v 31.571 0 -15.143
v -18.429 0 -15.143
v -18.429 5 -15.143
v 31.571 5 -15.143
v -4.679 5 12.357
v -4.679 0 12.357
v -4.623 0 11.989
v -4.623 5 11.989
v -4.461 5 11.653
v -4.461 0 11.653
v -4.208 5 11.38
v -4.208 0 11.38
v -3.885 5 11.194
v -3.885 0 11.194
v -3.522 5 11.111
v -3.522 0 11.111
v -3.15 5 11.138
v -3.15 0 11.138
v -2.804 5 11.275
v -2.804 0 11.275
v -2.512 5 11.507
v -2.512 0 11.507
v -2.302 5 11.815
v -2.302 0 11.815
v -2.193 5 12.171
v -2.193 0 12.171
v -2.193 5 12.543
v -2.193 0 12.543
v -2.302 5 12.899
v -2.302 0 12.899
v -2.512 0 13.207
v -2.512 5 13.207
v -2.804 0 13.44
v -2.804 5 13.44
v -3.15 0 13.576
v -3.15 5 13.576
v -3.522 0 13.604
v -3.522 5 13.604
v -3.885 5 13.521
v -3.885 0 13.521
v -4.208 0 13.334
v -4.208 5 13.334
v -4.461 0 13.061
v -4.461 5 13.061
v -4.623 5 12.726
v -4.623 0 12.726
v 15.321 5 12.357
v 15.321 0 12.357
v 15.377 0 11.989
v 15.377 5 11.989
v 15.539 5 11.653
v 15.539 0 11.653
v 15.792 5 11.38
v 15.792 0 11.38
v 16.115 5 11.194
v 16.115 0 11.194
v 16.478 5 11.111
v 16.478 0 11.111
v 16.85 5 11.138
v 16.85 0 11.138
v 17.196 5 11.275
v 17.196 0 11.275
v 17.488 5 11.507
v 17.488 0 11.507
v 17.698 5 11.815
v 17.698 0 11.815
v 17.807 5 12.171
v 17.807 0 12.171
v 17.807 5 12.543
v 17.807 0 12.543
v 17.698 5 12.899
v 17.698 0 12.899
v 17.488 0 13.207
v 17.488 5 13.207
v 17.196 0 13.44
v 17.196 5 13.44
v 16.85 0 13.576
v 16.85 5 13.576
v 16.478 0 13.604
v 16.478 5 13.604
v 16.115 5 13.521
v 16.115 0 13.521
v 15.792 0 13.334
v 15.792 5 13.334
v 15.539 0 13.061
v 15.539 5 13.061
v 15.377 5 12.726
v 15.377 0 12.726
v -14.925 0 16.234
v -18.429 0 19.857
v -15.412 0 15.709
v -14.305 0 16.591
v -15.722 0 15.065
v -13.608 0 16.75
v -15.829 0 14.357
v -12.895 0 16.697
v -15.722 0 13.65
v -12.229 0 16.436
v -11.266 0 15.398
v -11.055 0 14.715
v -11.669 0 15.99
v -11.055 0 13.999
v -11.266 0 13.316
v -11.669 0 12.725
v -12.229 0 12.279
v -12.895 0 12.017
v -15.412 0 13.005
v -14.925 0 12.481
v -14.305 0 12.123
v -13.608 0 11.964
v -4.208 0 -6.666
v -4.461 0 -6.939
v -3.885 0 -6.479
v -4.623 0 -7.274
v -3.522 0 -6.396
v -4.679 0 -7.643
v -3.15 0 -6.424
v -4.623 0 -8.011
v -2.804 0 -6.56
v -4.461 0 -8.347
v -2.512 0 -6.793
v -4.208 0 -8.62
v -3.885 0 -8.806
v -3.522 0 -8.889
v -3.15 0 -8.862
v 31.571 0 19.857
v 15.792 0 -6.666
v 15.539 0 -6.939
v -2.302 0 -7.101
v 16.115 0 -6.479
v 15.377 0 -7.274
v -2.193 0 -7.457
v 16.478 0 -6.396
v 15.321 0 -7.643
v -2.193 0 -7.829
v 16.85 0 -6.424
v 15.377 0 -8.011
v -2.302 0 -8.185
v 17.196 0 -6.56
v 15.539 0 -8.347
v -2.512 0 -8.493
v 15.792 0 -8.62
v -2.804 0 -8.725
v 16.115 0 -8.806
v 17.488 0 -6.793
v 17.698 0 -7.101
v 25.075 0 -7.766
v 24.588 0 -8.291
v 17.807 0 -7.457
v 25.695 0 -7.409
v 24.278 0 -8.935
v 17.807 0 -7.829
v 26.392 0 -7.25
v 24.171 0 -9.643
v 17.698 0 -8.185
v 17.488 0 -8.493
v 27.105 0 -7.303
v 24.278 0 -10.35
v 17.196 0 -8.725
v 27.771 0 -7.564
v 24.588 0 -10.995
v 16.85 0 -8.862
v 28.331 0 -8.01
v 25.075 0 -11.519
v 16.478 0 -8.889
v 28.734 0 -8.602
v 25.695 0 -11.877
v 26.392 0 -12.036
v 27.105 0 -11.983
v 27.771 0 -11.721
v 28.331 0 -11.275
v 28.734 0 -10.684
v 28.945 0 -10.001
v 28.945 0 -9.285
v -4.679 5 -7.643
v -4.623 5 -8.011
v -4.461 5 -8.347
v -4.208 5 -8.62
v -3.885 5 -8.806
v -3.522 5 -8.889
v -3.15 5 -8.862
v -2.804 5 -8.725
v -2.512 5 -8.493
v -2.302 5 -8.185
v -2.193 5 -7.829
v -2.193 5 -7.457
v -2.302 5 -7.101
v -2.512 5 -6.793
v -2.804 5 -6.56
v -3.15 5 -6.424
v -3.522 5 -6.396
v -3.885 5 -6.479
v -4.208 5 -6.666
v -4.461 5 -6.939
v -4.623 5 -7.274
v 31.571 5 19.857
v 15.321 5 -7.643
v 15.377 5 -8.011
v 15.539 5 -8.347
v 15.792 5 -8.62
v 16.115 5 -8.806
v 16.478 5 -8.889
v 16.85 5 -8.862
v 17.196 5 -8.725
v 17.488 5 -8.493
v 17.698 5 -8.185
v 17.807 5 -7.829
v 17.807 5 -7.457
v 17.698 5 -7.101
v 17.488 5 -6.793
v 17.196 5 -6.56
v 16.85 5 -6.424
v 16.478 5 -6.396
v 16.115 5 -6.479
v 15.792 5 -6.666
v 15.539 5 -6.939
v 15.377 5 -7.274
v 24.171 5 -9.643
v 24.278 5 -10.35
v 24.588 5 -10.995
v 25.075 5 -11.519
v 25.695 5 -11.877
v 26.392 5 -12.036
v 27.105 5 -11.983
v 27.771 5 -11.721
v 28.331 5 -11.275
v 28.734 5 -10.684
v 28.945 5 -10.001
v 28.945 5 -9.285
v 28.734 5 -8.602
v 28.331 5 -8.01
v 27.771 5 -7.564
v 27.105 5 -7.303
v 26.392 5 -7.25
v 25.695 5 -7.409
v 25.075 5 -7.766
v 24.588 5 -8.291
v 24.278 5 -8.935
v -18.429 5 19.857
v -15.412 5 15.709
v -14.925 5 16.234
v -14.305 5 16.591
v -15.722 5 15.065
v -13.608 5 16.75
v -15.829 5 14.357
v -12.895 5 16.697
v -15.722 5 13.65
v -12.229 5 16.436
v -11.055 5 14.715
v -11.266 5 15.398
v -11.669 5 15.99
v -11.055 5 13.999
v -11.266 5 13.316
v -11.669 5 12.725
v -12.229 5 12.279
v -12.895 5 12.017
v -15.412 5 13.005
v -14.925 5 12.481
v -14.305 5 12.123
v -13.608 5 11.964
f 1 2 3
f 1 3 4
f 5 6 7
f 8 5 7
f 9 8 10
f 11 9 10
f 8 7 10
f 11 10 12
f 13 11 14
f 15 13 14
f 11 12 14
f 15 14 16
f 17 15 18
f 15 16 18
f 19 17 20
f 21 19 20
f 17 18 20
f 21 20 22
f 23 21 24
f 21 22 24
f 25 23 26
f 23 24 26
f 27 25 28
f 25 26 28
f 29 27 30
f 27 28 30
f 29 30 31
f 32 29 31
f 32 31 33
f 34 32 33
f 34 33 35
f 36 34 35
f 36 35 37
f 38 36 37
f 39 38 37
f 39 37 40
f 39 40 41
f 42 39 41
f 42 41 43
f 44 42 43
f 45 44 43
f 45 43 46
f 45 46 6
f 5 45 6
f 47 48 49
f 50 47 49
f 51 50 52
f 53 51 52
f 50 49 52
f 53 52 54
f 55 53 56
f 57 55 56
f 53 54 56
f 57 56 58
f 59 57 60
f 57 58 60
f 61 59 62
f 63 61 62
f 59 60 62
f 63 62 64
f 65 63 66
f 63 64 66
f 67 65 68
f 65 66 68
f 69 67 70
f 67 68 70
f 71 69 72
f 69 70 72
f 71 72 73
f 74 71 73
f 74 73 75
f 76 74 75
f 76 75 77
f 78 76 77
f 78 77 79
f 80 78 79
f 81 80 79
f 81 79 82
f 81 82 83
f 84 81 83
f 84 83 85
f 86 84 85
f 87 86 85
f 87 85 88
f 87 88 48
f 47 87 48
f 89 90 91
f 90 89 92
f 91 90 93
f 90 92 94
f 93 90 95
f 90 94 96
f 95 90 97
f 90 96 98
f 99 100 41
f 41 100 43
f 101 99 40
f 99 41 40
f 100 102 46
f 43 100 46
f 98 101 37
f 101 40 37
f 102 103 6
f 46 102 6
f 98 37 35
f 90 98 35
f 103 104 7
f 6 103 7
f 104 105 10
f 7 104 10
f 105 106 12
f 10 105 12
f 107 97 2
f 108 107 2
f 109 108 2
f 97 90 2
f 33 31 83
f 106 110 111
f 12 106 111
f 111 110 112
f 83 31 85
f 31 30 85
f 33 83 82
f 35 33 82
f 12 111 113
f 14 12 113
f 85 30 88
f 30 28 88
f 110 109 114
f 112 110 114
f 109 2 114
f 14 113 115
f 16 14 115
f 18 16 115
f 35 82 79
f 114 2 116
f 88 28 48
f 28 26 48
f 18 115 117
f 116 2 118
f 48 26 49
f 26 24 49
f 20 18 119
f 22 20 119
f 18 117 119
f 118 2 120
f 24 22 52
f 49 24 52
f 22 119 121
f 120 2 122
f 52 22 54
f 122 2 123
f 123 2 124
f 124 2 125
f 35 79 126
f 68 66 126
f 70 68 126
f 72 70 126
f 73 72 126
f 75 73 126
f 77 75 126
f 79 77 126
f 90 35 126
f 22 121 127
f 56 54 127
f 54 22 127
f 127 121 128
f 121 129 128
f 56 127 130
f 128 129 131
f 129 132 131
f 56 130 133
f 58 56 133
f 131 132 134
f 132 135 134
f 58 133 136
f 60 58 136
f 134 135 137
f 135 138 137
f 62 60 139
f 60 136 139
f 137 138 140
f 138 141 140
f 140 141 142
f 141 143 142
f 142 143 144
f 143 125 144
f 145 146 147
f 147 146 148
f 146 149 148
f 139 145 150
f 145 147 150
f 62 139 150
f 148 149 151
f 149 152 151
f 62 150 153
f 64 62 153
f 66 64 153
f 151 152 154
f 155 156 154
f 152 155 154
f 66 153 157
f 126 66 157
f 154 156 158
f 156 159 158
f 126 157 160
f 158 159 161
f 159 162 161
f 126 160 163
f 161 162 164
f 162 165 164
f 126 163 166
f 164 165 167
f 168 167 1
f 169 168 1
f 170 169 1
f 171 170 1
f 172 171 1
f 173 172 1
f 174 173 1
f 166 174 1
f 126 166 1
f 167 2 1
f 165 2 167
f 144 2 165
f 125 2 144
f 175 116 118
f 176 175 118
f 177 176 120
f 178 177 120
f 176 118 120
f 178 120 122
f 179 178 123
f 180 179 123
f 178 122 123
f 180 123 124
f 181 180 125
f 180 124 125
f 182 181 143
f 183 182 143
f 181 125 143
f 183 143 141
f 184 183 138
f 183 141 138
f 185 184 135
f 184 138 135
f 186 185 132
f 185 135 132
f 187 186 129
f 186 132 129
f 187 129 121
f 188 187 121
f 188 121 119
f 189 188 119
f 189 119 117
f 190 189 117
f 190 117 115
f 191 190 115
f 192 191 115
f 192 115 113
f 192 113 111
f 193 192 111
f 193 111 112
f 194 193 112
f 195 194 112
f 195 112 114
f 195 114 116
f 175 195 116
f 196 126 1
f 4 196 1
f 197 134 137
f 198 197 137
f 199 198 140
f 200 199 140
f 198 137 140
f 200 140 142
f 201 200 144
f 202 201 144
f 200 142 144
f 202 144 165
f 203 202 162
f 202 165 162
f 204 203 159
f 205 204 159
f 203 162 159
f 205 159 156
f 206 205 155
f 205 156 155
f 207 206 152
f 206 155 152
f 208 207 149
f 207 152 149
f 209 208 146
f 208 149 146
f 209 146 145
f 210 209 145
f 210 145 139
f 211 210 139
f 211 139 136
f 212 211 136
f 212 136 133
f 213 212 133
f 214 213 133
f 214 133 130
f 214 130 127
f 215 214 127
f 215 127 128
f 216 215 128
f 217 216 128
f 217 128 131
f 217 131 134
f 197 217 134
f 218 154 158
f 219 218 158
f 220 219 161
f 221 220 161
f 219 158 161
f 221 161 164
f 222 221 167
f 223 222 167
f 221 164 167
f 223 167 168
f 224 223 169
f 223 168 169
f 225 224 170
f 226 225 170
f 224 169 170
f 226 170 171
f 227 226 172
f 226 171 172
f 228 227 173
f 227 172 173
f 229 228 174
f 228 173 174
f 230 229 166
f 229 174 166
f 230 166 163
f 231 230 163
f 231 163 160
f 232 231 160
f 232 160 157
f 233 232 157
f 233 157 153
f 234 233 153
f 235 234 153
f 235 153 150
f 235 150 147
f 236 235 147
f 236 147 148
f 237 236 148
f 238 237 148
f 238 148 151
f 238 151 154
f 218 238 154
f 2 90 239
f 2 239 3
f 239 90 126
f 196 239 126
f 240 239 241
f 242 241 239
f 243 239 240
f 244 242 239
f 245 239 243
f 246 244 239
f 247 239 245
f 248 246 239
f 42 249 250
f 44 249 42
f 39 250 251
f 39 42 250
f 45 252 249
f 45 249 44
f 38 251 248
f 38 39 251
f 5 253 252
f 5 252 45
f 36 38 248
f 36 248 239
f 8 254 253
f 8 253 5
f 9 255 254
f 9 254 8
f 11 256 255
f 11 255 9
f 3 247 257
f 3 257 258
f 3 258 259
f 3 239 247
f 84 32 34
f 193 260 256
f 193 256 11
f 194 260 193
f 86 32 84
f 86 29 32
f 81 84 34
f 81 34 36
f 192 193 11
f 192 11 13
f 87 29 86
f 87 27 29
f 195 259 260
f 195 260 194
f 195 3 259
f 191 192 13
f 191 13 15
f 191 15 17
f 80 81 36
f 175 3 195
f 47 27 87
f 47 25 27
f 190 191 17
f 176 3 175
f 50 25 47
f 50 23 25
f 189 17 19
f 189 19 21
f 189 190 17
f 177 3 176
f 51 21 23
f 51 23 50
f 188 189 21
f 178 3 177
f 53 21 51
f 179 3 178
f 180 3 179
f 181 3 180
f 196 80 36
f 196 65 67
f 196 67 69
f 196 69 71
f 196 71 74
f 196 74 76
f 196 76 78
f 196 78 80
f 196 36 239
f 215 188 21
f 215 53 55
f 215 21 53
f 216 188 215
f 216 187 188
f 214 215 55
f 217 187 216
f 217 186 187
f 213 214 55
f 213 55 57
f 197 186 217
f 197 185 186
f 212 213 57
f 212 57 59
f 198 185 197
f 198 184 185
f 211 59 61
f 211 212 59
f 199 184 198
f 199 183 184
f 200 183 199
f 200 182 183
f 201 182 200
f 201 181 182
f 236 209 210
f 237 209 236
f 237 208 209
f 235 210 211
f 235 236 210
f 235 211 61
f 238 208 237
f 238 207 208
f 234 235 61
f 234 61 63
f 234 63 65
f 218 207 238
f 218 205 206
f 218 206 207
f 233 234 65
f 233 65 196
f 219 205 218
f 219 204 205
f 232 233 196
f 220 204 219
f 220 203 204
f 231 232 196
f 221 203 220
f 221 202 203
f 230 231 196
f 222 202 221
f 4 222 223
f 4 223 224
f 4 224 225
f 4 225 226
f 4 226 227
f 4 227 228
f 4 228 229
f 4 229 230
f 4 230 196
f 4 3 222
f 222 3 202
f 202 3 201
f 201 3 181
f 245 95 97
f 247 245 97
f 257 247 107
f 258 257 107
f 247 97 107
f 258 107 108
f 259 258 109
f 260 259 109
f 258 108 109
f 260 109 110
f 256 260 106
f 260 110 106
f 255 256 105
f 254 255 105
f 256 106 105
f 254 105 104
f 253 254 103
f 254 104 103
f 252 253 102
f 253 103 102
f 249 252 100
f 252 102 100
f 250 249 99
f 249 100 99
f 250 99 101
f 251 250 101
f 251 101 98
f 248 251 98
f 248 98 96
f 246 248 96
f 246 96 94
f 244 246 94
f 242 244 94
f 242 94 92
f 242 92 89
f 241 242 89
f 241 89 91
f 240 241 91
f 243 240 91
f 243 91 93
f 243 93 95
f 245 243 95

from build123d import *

# Parameters (mm, degrees)
ESQUISSE1_W                               = 50
ESQUISSE1_H                               = 35
BOSS_EXTRU_1_DEPTH                        = 5
TROU_POUR_TARAUDAGE_POUR_TROU_TARAUD_M3_D = 2.5
D_GAGEMENT_M43_D                          = 4.8


with BuildPart() as part:
    # Esquisse1 → Boss.-Extru.1 (new body)
    with BuildSketch(Plane(origin=(0, 0, 0), x_dir=(1, 0, 0), z_dir=(0, 1, 0))):
        with Locations((6.571428571, -2.357142857)):
            Rectangle(ESQUISSE1_W, ESQUISSE1_H)
    extrude(amount=BOSS_EXTRU_1_DEPTH)

    # Trou pour taraudage pour trou taraudé M33 (through all)
    with Locations(Plane(origin=(0, 5, 0), x_dir=(1, 0, 0), z_dir=(0, 1, 0))):
        with Locations((16.571428571, 7.642857143), (-3.428571429, 7.642857143), (16.571428571, -12.357142857), (-3.428571429, -12.357142857)):
            Hole(TROU_POUR_TARAUDAGE_POUR_TROU_TARAUD_M3_D / 2)

    # Dégagement M43 (through all)
    with Locations(Plane(origin=(0, 5, 0), x_dir=(1, 0, 0), z_dir=(0, 1, 0))):
        with Locations((26.571428571, 9.642857143), (-13.428571429, -14.357142857)):
            Hole(D_GAGEMENT_M43_D / 2)


solid = part.part
